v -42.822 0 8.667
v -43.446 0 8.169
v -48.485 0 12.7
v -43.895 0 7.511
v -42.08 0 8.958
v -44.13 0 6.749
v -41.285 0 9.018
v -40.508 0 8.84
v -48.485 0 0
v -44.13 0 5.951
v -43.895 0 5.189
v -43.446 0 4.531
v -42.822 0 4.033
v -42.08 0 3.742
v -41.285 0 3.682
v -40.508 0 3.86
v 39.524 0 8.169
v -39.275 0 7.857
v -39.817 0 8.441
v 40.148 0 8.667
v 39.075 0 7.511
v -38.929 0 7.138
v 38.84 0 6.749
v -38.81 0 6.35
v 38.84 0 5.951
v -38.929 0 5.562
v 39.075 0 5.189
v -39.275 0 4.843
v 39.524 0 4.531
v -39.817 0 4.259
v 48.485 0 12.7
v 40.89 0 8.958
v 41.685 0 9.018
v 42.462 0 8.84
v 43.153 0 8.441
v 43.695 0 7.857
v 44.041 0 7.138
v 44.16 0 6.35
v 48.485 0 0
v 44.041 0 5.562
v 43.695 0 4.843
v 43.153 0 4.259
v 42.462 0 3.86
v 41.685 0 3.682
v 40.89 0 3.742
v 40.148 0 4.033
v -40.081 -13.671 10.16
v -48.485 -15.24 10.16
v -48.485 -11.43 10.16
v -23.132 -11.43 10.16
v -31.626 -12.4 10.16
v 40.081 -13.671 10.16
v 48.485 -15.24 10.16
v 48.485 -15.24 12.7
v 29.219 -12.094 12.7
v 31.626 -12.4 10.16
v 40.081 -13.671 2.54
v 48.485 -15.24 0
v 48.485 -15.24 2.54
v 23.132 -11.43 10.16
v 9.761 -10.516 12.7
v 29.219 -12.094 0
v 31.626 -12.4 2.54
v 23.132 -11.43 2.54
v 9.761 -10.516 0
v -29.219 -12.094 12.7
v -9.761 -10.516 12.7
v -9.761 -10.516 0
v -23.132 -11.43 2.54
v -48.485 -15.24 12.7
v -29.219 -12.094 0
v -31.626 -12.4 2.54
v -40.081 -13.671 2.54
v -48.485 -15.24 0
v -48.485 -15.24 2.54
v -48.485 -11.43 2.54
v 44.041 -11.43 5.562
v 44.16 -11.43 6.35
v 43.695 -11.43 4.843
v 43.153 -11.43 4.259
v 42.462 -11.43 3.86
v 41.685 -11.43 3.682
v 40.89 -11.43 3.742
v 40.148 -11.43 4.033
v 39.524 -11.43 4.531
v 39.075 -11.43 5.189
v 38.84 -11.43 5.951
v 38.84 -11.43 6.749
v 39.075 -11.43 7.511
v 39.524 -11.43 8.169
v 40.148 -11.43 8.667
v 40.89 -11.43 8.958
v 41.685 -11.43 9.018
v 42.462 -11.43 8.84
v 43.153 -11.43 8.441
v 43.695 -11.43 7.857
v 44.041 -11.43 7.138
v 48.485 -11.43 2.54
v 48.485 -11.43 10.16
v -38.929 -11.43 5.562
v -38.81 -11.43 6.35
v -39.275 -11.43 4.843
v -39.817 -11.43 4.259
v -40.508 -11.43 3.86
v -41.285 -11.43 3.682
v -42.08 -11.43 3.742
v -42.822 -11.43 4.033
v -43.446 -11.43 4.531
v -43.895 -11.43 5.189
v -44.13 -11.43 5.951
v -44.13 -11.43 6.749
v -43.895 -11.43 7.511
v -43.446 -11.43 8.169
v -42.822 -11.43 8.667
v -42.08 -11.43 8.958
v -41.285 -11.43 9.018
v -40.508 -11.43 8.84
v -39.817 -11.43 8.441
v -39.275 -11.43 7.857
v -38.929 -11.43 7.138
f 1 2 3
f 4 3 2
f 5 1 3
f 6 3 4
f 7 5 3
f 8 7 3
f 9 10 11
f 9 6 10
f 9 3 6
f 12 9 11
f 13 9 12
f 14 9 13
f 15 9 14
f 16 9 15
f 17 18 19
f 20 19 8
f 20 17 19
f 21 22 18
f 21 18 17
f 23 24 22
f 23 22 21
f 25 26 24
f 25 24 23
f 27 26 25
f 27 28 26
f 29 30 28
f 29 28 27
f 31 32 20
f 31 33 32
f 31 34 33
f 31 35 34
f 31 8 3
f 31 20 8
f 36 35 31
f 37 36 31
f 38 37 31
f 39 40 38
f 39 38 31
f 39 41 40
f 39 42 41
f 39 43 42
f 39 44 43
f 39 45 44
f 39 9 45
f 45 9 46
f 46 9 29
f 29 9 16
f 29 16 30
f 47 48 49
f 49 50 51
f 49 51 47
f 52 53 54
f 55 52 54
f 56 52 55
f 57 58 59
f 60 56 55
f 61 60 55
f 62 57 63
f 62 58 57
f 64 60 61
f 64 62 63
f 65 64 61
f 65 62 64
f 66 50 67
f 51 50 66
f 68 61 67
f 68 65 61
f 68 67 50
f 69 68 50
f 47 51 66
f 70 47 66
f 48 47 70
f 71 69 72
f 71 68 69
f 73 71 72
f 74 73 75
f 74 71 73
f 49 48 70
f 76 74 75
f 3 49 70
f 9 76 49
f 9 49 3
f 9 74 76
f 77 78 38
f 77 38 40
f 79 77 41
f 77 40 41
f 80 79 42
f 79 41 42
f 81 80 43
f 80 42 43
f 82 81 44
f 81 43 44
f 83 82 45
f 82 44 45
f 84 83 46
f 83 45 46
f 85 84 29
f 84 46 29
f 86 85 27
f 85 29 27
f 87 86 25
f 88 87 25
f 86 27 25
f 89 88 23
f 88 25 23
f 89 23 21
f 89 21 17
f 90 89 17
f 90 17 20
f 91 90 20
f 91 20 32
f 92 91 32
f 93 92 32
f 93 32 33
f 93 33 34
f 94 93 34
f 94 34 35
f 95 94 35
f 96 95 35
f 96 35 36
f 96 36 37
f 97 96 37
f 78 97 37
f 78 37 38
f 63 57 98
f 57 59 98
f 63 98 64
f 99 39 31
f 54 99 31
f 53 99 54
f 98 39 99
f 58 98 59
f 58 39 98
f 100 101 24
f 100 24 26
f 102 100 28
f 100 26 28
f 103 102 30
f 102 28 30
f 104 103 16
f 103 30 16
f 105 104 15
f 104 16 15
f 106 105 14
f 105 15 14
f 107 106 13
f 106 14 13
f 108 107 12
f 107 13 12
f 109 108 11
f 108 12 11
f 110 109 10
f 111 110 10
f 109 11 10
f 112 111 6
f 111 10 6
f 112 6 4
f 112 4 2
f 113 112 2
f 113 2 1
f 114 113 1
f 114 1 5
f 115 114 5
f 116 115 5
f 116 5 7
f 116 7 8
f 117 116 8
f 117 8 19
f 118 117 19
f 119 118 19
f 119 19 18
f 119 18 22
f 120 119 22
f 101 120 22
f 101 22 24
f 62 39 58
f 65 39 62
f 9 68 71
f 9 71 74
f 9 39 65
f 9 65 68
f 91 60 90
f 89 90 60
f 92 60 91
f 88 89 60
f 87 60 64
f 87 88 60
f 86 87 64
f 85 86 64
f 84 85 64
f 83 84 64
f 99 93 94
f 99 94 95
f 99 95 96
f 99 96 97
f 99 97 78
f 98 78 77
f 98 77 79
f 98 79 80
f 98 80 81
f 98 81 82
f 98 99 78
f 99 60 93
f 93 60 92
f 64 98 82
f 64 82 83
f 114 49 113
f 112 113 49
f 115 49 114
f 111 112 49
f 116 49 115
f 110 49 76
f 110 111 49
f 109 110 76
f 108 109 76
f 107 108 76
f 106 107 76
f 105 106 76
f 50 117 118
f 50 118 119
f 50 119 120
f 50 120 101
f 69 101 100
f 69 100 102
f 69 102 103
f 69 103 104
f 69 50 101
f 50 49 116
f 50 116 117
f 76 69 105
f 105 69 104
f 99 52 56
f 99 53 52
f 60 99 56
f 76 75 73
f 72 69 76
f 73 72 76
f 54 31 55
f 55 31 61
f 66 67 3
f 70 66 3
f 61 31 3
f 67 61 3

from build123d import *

# Parameters (mm, degrees)
BOSS_EXTRUDE1_DEPTH = 12.7
SKETCH2_R           = 2.675
CUT_EXTRUDE1_DEPTH  = 16.24
SKETCH3_W           = 7.62
SKETCH3_H           = 3.81
CUT_EXTRUDE2_DEPTH  = 97.9700001


with BuildPart() as part:
    # Sketch1 → Boss-Extrude1 (new body)
    with BuildSketch(Plane.XY):
        with BuildLine():
            Line((-48.485, 0), (48.485, 0))
            Line((48.485, 0), (48.485, -15.24))
            ThreePointArc((48.485, -15.24), (0, -10.318710494), (-48.485, -15.24))
            Line((-48.485, -15.24), (-48.485, 0))
        make_face()
    extrude(amount=BOSS_EXTRUDE1_DEPTH)

    # Sketch2 → Cut-Extrude1 (cut, through all)
    with BuildSketch(Plane(origin=(0, 0, 0), x_dir=(1, 0, 0), z_dir=(0, 1, 0))):
        with Locations((-41.485, -6.35)):
            Circle(SKETCH2_R)
        with Locations((41.485, -6.35)):
            Circle(SKETCH2_R)
    extrude(amount=-CUT_EXTRUDE1_DEPTH, mode=Mode.SUBTRACT)

    # Sketch3 → Cut-Extrude2 (cut, through all)
    with BuildSketch(Plane(origin=(48.485, 0, 0), x_dir=(0, 0, -1), z_dir=(1, 0, 0))):
        with Locations((-6.35, -13.335)):
            Rectangle(SKETCH3_W, SKETCH3_H)
    extrude(amount=-CUT_EXTRUDE2_DEPTH, mode=Mode.SUBTRACT)


solid = part.part
